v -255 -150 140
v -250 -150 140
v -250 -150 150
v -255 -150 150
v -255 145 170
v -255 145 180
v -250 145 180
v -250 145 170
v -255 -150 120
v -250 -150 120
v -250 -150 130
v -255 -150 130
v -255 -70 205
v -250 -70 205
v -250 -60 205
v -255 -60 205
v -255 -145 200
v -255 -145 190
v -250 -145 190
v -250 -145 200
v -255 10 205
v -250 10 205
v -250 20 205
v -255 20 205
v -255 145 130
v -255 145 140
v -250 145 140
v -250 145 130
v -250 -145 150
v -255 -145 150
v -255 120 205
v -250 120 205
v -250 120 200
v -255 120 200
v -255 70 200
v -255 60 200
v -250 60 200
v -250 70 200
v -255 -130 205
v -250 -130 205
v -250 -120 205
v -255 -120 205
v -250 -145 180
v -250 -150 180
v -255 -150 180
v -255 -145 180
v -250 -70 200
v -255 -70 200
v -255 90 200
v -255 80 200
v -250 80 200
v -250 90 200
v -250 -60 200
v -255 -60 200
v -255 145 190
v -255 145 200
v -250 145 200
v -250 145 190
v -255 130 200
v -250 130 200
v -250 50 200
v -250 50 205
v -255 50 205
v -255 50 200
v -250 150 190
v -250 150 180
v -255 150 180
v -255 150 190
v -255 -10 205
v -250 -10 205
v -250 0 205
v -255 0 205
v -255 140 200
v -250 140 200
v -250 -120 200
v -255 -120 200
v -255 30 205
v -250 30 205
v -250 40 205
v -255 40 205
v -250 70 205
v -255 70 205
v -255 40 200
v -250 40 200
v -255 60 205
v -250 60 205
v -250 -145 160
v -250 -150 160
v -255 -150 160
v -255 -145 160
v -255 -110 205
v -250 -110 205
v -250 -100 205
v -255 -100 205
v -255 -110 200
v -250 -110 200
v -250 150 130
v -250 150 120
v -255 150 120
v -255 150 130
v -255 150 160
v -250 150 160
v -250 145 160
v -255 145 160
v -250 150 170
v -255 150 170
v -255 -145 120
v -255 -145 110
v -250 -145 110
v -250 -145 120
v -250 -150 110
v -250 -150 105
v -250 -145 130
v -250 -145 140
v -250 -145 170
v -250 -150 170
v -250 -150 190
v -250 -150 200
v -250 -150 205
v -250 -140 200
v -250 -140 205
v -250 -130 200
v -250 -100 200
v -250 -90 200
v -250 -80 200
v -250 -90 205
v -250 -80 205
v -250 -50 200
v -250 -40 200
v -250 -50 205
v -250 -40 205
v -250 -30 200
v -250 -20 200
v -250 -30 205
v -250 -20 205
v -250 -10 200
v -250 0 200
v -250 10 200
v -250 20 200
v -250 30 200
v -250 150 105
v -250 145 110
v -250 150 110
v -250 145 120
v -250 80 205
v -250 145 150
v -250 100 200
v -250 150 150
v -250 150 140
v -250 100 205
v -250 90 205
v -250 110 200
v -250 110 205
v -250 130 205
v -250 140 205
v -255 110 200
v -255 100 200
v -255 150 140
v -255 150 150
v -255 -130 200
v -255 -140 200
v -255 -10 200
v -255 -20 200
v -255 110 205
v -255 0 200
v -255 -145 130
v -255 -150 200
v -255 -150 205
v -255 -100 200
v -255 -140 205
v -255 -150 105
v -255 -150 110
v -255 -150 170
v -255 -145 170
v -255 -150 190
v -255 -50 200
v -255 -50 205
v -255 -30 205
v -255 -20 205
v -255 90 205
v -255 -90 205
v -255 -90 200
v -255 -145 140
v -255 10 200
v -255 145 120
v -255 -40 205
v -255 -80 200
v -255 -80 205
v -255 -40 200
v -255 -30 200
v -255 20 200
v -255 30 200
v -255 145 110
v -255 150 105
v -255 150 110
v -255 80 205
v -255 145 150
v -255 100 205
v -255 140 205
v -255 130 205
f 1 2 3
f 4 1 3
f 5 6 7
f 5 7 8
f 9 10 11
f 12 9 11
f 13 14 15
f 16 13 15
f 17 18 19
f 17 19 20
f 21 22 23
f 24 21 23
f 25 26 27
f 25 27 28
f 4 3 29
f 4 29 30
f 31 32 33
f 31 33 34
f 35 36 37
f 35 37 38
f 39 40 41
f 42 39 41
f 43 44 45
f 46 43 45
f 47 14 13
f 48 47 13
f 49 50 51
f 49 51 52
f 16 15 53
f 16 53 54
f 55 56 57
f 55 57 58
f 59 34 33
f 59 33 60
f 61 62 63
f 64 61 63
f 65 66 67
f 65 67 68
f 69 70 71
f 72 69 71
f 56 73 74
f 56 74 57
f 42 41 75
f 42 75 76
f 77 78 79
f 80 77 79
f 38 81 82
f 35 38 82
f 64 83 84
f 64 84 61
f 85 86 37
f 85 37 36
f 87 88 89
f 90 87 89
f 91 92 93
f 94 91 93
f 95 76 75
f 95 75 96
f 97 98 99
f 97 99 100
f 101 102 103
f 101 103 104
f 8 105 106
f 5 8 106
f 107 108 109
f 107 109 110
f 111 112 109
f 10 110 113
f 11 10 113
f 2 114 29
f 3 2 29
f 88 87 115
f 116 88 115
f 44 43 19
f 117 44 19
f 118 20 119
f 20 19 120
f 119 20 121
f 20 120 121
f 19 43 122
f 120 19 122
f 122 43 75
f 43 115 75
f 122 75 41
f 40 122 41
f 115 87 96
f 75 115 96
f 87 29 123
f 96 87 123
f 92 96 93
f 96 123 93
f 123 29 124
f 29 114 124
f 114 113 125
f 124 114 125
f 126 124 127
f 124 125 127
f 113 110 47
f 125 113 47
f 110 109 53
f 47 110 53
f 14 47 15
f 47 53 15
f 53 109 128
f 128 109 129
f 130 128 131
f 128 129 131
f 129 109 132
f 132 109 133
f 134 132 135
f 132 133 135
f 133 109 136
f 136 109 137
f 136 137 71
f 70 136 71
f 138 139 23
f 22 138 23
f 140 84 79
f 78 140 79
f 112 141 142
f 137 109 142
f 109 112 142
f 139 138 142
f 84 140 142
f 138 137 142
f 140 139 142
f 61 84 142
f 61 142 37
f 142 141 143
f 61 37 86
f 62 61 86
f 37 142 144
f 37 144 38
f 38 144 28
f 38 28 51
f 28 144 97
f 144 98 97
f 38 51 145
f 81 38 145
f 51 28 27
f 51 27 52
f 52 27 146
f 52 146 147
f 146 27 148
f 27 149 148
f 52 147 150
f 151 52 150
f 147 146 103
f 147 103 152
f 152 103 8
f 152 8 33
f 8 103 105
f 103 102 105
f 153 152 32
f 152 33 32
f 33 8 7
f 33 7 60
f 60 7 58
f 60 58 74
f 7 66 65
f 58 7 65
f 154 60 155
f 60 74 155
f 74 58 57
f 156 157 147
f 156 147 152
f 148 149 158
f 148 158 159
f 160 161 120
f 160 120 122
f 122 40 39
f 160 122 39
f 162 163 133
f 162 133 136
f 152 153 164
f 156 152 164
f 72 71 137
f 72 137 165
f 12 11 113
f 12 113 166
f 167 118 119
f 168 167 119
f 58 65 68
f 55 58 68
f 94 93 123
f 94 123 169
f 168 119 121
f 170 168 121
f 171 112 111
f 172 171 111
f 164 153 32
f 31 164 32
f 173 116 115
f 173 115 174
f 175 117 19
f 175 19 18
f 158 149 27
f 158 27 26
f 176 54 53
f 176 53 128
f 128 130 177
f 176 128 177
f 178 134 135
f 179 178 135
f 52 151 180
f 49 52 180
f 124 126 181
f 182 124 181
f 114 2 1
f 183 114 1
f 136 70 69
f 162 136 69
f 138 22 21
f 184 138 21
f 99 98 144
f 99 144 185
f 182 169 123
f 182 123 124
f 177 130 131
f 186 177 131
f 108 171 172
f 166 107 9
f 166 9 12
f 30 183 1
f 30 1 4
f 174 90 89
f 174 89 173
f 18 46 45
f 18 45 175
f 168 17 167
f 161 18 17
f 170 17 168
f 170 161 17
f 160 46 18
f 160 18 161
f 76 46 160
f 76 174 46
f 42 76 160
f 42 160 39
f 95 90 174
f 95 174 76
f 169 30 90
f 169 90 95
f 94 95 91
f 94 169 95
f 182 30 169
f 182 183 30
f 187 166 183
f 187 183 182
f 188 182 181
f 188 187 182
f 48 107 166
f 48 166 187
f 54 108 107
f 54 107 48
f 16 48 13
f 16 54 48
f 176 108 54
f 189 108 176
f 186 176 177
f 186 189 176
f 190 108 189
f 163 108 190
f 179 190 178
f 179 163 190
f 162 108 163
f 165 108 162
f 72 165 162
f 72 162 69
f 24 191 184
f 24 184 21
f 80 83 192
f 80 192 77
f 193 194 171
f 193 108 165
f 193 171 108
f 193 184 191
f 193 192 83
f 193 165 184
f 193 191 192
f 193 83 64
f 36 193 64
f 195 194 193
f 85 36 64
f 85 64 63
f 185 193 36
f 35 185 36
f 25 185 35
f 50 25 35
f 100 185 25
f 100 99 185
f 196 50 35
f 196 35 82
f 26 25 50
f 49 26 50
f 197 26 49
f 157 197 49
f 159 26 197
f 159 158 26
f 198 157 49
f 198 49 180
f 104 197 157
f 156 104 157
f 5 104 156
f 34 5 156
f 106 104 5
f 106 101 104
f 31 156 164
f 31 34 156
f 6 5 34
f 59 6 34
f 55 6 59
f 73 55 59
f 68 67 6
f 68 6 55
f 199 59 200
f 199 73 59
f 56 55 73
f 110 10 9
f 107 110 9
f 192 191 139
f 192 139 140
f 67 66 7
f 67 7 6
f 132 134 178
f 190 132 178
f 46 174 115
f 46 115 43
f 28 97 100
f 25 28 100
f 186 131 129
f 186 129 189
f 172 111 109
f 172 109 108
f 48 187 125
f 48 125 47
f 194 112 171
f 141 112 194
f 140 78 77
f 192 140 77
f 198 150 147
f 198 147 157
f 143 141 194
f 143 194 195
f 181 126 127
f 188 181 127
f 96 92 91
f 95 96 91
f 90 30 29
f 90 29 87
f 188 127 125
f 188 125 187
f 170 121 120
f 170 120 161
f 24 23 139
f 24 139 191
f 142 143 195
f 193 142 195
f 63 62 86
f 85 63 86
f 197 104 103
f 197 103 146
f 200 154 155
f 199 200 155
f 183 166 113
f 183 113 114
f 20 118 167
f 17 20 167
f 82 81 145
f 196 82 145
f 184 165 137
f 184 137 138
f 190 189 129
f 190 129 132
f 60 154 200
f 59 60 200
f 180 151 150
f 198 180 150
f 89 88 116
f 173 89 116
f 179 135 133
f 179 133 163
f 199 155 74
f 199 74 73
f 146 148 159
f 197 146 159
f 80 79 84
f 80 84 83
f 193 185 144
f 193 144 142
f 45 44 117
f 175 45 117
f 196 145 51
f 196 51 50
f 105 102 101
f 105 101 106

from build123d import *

# Parameters (mm, degrees)
SKETCH014_W             = 100
SKETCH014_H             = 300
PAD012_DEPTH            = 5
SKETCH037_W             = 10
SKETCH037_H             = 5
POCKET008_DEPTH         = 5
LINEARPATTERN017_COUNT  = 5
LINEARPATTERN017_PITCH  = 20
SKETCH038_W             = 10
SKETCH038_H             = 5
POCKET009_DEPTH         = 5
LINEARPATTERN018_COUNT  = 5
LINEARPATTERN018_PITCH  = 20
SKETCH039_W             = 10
SKETCH039_H             = 5
POCKET010_DEPTH         = 5
LINEARPATTERN019_COUNT  = 15
LINEARPATTERN019_PITCH  = 20
BODY012_PLACEMENT_ANGLE = 90


with BuildPart() as part:
    # Sketch014 → Pad012 (new body)
    with BuildSketch(Plane.XY):
        Rectangle(SKETCH014_W, SKETCH014_H)
    extrude(amount=PAD012_DEPTH)

    # Sketch037 (on DatumPlane) → Pocket008 (cut)
    with BuildSketch(Plane.XZ.offset(150)):
        with Locations((-40, 2.5)):
            Rectangle(SKETCH037_W, SKETCH037_H)
    pocket008 = extrude(amount=-POCKET008_DEPTH, mode=Mode.SUBTRACT)

    # LinearPattern017: Pocket008 ×5
    with Locations(*[(i * LINEARPATTERN017_PITCH, 0, 0) for i in range(1, LINEARPATTERN017_COUNT)]):
        add(pocket008, mode=Mode.SUBTRACT)

    # Sketch038 (on DatumPlane) → Pocket009 (cut)
    with BuildSketch(Plane(origin=(0, 150, 0), x_dir=(-1, 0, 0), z_dir=(0, 1, 0))):
        with Locations((-40, 2.5)):
            Rectangle(SKETCH038_W, SKETCH038_H)
    pocket009 = extrude(amount=-POCKET009_DEPTH, mode=Mode.SUBTRACT)

    # LinearPattern018: Pocket009 ×5
    with Locations(*[(-i * LINEARPATTERN018_PITCH, 0, 0) for i in range(1, LINEARPATTERN018_COUNT)]):
        add(pocket009, mode=Mode.SUBTRACT)

    # Sketch039 (on DatumPlane) → Pocket010 (cut)
    with BuildSketch(Plane.YZ.offset(50)):
        with Locations((-135, 2.5)):
            Rectangle(SKETCH039_W, SKETCH039_H)
    pocket010 = extrude(amount=-POCKET010_DEPTH, mode=Mode.SUBTRACT)

    # LinearPattern019: Pocket010 ×15
    with Locations(*[(0, i * LINEARPATTERN019_PITCH, 0) for i in range(1, LINEARPATTERN019_COUNT)]):
        add(pocket010, mode=Mode.SUBTRACT)


with BuildPart() as part_1:
    # Body012 placement: moved
    add(part.part.moved(Location((-250, 0, 155))).rotate(Axis((-250, 0, 155), (0, -1, 0)), BODY012_PLACEMENT_ANGLE))


solid = part_1.part
